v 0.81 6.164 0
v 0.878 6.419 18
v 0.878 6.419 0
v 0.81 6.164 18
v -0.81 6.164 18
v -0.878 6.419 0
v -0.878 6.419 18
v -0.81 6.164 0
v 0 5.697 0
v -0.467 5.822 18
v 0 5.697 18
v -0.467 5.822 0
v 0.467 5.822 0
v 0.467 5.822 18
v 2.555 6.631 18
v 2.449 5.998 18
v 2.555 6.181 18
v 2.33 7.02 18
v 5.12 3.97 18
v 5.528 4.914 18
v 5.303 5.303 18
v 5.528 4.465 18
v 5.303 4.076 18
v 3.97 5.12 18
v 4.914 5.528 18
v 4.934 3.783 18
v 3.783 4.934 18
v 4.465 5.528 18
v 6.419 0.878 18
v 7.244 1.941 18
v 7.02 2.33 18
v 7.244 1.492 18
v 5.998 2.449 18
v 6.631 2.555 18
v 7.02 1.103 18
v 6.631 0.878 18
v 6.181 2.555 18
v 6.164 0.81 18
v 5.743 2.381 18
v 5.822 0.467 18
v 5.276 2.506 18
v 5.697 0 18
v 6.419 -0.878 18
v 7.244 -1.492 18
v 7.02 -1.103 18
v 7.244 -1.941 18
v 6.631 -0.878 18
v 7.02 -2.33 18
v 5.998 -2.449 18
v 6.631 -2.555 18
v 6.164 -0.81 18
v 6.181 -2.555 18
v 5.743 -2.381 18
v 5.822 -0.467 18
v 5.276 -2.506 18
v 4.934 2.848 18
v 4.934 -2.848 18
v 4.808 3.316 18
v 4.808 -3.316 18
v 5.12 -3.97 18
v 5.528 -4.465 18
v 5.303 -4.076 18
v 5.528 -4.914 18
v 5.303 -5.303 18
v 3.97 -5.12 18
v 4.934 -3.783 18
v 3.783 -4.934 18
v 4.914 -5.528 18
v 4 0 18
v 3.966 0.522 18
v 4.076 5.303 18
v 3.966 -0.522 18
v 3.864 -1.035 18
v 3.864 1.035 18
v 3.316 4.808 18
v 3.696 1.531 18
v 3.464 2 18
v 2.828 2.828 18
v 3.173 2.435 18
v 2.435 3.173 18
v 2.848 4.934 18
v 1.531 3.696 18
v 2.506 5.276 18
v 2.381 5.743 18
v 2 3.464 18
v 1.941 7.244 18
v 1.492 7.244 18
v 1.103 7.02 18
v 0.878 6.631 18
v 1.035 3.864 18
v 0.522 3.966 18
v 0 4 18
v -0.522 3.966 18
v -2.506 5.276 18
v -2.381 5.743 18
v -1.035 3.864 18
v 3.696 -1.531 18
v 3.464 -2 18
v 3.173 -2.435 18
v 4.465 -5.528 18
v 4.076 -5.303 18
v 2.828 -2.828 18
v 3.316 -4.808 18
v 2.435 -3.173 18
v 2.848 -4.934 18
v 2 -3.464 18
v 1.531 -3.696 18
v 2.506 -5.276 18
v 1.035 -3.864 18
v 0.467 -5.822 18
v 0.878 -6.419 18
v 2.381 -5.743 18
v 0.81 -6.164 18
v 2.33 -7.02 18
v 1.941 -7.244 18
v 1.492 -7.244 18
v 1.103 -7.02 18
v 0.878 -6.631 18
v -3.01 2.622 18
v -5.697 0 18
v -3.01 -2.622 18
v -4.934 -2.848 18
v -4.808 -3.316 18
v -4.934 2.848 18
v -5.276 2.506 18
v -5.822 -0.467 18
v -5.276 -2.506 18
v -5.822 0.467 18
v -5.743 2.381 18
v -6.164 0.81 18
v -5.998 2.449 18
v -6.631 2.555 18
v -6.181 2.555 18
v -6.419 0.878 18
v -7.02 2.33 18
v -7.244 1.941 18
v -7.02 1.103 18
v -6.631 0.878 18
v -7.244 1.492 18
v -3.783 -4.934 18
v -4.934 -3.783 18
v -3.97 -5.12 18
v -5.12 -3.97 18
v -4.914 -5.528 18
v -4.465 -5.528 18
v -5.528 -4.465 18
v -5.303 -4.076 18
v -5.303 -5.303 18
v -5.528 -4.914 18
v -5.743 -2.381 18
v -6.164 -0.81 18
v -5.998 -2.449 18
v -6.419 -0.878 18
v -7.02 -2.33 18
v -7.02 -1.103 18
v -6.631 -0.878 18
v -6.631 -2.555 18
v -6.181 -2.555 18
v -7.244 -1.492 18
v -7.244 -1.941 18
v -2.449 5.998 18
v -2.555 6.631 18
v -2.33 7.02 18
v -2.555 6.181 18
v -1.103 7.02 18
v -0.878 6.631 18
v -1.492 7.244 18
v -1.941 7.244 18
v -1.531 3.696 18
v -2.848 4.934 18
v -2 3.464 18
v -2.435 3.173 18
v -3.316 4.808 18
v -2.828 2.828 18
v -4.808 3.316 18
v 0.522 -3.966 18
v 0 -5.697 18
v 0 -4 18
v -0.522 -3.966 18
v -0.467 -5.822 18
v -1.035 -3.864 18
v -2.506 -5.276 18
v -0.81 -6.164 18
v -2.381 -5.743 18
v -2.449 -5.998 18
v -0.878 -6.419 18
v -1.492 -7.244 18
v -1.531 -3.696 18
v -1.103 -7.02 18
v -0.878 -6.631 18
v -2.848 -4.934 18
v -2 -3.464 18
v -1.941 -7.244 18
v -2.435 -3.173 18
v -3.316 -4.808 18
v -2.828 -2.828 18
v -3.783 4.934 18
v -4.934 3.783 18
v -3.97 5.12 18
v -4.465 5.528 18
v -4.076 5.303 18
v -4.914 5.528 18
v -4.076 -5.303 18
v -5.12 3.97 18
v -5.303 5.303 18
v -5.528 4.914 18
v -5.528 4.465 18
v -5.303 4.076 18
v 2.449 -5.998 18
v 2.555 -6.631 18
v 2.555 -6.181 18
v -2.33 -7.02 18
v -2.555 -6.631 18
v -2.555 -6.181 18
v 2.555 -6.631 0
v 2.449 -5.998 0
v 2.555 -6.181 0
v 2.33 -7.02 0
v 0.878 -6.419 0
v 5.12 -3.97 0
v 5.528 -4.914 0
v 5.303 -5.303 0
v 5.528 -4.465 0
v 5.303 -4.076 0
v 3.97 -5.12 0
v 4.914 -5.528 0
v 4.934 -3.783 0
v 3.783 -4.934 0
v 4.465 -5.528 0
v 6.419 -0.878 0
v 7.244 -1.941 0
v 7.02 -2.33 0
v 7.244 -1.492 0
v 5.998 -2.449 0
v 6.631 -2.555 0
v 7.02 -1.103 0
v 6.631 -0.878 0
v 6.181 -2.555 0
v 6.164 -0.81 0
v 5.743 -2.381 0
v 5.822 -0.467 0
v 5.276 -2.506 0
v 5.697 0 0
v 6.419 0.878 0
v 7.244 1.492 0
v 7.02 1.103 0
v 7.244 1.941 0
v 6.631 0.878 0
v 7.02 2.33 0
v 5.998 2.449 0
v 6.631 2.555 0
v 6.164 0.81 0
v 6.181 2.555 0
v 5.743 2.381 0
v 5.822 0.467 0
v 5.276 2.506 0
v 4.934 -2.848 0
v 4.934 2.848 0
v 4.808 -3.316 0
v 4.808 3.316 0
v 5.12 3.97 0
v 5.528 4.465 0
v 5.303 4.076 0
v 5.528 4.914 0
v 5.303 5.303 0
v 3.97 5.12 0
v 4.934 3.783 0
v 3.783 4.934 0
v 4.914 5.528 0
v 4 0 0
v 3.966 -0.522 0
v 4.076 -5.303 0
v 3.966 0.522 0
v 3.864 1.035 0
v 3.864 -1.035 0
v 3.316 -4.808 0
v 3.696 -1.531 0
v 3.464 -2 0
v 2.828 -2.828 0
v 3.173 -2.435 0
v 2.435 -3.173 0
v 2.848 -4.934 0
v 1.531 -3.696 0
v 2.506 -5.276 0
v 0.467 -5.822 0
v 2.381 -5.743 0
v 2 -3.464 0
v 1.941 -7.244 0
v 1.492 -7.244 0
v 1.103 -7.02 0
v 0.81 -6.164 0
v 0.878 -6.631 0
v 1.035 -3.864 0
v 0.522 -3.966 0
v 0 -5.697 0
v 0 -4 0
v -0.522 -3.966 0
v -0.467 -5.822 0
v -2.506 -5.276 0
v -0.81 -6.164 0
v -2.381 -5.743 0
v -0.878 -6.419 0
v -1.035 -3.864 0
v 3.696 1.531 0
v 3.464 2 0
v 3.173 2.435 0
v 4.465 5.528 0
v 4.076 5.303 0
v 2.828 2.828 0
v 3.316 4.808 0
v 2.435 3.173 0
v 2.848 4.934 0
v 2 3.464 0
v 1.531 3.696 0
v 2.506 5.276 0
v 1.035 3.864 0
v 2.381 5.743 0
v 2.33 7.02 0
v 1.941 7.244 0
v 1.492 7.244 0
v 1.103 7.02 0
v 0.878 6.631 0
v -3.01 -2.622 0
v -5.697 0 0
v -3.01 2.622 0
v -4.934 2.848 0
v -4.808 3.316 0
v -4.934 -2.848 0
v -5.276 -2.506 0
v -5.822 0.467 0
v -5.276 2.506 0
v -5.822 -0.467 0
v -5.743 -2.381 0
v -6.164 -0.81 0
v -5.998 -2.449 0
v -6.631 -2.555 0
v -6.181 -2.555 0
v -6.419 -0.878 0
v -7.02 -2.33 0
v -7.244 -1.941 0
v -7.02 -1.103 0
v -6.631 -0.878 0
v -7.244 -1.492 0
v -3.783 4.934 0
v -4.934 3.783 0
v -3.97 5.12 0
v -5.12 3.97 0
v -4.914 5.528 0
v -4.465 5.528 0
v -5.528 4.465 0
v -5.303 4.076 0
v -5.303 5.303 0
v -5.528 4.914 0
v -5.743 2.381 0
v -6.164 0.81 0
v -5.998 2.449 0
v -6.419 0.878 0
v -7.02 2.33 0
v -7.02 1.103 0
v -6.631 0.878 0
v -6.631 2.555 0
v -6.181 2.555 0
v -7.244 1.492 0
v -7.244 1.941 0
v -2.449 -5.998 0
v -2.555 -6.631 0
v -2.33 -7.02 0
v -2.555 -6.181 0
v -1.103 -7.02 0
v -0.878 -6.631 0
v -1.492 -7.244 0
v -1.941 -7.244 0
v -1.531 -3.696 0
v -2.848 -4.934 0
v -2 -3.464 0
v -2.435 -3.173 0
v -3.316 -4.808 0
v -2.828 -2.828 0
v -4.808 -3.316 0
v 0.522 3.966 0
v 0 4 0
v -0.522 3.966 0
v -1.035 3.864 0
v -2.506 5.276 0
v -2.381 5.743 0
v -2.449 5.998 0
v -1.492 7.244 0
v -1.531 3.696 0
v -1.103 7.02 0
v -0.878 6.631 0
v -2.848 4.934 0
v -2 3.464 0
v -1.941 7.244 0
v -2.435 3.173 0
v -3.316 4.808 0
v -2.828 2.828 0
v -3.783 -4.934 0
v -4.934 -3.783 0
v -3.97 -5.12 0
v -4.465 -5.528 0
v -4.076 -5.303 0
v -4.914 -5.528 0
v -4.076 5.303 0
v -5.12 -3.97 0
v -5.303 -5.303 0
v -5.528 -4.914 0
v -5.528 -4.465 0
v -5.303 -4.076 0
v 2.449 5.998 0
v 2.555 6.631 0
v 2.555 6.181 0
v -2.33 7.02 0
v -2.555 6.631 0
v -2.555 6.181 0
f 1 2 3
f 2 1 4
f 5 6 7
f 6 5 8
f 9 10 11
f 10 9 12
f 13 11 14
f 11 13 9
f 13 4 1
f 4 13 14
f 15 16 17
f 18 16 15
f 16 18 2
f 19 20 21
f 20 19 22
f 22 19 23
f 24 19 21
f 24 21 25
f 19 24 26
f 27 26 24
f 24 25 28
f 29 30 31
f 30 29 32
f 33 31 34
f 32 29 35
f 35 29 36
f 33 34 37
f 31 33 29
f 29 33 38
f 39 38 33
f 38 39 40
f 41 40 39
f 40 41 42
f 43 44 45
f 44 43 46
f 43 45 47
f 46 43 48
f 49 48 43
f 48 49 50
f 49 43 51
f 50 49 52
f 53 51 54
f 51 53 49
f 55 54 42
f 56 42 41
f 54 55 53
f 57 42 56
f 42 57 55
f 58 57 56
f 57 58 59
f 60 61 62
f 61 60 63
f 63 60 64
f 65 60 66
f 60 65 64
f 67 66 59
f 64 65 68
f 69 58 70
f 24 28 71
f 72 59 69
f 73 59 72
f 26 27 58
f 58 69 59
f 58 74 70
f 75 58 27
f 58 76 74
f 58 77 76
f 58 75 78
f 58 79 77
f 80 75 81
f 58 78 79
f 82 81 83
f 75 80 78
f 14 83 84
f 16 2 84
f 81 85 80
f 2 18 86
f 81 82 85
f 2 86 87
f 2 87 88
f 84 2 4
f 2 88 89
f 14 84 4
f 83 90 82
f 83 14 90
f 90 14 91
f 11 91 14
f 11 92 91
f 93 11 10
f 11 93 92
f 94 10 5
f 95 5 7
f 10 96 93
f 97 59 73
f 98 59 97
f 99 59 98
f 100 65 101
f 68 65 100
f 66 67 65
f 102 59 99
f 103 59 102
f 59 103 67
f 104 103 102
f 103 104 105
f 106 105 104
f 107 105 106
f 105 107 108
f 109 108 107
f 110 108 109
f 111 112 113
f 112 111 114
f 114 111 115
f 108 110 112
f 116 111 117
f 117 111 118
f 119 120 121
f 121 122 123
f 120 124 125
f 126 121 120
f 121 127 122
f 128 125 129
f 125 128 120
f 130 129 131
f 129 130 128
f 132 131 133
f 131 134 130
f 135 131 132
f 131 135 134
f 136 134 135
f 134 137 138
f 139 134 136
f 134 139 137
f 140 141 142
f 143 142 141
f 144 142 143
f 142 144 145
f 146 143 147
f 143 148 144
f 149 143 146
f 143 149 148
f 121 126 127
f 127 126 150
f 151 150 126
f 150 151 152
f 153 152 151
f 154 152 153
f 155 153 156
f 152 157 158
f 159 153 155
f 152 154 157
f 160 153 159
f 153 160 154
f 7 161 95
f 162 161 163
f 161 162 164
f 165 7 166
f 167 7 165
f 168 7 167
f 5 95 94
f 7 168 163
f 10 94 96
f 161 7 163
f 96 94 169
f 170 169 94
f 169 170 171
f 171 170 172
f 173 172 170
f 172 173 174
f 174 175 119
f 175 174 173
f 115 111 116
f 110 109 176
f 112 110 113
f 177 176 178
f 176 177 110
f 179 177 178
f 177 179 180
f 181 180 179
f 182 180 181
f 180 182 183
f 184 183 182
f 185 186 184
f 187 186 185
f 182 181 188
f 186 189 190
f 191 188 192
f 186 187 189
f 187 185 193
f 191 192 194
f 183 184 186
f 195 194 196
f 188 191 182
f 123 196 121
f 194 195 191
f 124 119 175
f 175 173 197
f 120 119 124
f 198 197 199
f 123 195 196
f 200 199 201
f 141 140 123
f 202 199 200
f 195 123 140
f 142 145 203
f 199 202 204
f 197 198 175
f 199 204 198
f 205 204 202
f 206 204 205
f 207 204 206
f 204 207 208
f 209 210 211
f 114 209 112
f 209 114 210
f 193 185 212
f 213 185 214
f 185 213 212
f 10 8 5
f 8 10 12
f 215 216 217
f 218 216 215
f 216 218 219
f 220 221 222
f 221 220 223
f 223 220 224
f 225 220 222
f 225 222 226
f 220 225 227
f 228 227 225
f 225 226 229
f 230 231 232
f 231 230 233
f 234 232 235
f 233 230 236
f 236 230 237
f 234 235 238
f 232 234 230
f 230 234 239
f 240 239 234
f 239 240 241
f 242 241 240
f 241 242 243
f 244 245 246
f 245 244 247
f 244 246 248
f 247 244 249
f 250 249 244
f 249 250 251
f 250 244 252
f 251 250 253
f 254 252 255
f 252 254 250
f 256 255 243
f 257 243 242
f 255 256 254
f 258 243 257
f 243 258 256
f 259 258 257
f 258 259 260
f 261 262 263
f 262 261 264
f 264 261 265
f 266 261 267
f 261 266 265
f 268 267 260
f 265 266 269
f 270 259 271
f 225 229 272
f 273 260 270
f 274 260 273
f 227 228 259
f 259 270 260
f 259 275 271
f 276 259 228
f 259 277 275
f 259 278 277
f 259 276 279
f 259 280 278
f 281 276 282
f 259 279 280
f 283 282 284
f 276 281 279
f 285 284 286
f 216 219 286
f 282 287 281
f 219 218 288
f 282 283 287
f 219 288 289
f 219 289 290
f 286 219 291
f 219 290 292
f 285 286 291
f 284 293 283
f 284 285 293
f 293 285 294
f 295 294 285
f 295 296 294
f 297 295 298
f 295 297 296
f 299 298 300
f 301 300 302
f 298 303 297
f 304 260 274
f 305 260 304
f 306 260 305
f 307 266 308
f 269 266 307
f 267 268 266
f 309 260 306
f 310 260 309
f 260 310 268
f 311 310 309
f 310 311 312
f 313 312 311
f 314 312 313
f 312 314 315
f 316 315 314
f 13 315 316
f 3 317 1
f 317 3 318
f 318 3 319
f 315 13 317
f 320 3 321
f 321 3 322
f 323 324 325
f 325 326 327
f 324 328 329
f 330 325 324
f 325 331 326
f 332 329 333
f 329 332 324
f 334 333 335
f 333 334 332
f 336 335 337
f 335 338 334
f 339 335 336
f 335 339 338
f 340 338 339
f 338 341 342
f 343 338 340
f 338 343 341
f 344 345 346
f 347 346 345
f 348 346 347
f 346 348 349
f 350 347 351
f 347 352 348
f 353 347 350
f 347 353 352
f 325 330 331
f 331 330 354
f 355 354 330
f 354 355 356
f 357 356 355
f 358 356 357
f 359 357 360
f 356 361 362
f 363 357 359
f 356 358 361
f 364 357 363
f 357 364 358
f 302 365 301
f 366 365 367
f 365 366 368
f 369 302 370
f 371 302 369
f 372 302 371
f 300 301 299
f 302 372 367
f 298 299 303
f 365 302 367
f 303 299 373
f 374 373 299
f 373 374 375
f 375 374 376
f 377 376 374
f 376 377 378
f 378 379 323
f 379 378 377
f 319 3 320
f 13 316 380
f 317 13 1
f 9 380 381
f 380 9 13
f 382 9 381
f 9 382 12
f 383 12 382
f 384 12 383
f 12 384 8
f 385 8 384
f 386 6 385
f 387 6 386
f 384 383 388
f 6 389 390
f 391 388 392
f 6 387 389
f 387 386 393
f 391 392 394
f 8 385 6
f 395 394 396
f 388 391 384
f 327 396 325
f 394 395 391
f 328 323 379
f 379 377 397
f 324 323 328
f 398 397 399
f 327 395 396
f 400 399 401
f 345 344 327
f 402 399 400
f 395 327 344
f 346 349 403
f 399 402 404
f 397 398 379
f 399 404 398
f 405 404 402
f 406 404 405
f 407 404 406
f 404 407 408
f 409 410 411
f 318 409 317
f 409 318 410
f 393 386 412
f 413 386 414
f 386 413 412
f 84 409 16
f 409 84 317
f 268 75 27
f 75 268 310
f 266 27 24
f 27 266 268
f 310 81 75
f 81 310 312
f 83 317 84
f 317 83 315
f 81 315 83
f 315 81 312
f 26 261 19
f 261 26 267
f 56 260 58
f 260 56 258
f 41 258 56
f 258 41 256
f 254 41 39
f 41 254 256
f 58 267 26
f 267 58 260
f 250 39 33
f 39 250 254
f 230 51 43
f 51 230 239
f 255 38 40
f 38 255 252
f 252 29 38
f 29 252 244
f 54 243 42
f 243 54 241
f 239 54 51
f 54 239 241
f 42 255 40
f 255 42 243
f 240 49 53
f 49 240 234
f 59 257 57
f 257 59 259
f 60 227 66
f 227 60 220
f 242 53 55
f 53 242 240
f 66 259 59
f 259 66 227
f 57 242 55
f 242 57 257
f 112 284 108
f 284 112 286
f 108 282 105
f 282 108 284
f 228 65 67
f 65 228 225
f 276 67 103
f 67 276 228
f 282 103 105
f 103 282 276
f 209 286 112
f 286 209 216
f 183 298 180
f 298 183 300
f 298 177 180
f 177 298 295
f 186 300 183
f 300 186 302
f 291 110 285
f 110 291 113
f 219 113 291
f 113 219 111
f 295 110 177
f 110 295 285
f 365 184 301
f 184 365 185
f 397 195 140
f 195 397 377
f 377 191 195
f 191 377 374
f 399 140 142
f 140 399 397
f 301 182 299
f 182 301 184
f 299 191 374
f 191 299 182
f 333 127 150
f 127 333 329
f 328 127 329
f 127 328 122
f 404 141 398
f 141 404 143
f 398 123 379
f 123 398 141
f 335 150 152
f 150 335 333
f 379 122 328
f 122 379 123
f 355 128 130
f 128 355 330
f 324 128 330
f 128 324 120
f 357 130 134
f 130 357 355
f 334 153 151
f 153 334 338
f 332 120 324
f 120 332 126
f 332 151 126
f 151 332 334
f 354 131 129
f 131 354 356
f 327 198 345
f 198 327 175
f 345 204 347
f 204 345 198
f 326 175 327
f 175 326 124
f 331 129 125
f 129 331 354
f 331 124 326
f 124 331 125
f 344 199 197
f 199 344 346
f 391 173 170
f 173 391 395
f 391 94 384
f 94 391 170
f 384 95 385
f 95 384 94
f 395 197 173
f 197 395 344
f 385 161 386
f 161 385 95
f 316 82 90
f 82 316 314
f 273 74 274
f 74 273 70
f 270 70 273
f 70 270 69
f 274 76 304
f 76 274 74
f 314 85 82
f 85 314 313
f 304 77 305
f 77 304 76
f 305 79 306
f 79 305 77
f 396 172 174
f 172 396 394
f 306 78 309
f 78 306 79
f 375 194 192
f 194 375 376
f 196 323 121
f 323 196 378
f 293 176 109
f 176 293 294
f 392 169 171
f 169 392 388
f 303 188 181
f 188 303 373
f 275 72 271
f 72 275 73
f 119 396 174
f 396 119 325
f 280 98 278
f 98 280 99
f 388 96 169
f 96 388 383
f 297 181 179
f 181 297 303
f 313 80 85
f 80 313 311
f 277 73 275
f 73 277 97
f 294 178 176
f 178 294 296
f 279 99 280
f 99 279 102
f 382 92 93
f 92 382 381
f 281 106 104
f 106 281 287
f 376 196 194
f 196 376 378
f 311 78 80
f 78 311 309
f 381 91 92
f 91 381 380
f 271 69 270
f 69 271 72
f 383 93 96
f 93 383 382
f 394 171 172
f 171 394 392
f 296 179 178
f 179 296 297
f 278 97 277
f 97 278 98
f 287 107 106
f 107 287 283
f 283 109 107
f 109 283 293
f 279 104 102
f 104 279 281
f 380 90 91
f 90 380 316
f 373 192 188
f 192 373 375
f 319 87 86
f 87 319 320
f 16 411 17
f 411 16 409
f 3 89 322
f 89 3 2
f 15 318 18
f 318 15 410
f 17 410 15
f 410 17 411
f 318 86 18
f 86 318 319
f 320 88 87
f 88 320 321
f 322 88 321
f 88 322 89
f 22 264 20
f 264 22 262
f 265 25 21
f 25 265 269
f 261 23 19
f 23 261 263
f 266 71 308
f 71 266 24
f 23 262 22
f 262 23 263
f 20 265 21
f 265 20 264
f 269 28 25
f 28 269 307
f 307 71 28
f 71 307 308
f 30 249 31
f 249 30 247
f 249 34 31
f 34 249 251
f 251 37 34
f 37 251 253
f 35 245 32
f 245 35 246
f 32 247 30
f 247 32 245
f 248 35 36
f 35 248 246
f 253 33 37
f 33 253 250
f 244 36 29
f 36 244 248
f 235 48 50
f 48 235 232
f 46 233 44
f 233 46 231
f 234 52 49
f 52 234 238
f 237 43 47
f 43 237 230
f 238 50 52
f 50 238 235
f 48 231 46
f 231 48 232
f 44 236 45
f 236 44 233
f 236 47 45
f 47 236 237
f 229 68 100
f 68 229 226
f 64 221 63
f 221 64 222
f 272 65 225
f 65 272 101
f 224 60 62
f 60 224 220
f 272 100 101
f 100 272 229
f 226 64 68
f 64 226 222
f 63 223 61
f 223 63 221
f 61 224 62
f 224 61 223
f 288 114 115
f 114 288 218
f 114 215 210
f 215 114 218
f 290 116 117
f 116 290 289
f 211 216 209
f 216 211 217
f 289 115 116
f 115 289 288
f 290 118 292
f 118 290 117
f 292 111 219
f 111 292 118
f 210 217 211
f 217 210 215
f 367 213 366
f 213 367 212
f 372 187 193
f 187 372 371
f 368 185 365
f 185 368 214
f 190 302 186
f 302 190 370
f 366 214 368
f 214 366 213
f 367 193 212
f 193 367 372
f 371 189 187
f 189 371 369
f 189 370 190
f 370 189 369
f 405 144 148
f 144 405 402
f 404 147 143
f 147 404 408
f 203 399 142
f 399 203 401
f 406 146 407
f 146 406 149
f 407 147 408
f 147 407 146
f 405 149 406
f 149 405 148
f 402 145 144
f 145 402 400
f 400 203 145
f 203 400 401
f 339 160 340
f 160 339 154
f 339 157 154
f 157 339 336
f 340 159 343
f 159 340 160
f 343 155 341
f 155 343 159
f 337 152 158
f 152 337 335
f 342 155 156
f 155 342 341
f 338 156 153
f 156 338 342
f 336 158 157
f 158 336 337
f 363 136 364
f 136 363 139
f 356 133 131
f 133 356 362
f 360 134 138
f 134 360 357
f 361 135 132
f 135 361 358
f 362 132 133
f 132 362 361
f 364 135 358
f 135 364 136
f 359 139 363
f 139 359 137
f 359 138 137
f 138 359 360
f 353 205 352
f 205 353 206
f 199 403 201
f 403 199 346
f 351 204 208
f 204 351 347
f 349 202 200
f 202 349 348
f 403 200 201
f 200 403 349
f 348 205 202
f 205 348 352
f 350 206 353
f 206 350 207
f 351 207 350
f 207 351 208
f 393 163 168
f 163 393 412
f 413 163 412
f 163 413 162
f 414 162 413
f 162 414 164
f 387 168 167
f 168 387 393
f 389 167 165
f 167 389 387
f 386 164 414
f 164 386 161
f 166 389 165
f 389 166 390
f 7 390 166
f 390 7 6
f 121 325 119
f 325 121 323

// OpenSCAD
// [FL_INDEX: keywords="openscad, 3d_parametric, Customizable_Gear4, csg_solid" | COT="Parametric OpenSCAD design from 3DCodeverse"]
// Title: Customizable Gear4

// Takuya Yamaguchi

// ignore variable values
//$fn=48;

//custermizing data

// number of tooth
nt =12;

//shaft diameter		
sd =8;

//gear diameter		
gd=15;

// fringe thickness		
ggdt=1.5;	

// gear hight
gh=18;

//number of fringe		
nf=0;	//[0,1,2]

//tooth shape	
$fn=12; //[4,5,6,7,8,12]

//Dcut yes or no
Dcut="yes";//[yes,no]

// ignore variable values
gpr=gd*3.14159/4/nt/(1+3.141592/nt/2);	//gear tooth r
gmr=gpr*1.077; 							// gear gap r
ggd=gd+4; 									// fringe diameter
dh=gh; 										//Dcut hight
off= 360/nt/2;  							// tooth offset

module pgear()

	union(){
	translate([0, 0, 0]) {
		difference() {
         union(){  //gear & fringe
		  translate([0, 0, 0]) cylinder(h = gh, r =gd/2-gpr,$fn=48); //gear
      if (nf == 1){
          translate([0, 0, gh-ggdt])cylinder(h = ggdt, r= ggd/2,$fn=96); //fringe
      				}
      if (nf == 2){
         translate([0, 0, gh-ggdt])cylinder(h = ggdt, r= ggd/2,$fn=96); //fringe
         translate([0, 0, 0])cylinder(h = ggdt, r= ggd/2,$fn=96); //fringe
                   }
                 }
translate([0, 0, -0.5])  // shaft 
			cylinder(h = gh+2.5, r= sd/2,$fn=48);

		for (i = [0:(nt-1)]) { 		//gear gap
			echo(360*i/nt, sin(360*i/nt)*(gd/2-gpr), cos(360*i/nt)*(gd/2-gpr));
			translate([sin(360*i/nt)*(gd/2-gpr), cos(360*i/nt)*(gd/2-gpr), ggdt*nf*(nf-1)*0.5])
				rotate([0,0,90*(1-2/$fn)-360*i/nt-($fn-1)*off]) cylinder(h = gh-ggdt*nf, r=gmr);
		                      }
     							}
		for (i = [0:(nt-1)]) {  // Gear tooth
			echo(360*i/nt+off, sin(360*i/nt+off)*(gd/2-gpr), cos(360*i/nt+off)*(gd/2-gpr));
			translate([sin(360*i/nt+off)*(gd/2-gpr), cos(360*i/nt+off)*(gd/2-gpr), 0 ])
				rotate([0,0,90*(1-2/$fn)-360*i/nt-$fn*off]) cylinder(h = gh, r=gpr);
		                      }
                }


 			
	 // Dcut
 if (Dcut== "yes"){
         translate([-(sd/2.1), 0, gh/2]) cube([sd/5,sd*0.8,dh], center = true); // Dcut
       }
}

pgear();
